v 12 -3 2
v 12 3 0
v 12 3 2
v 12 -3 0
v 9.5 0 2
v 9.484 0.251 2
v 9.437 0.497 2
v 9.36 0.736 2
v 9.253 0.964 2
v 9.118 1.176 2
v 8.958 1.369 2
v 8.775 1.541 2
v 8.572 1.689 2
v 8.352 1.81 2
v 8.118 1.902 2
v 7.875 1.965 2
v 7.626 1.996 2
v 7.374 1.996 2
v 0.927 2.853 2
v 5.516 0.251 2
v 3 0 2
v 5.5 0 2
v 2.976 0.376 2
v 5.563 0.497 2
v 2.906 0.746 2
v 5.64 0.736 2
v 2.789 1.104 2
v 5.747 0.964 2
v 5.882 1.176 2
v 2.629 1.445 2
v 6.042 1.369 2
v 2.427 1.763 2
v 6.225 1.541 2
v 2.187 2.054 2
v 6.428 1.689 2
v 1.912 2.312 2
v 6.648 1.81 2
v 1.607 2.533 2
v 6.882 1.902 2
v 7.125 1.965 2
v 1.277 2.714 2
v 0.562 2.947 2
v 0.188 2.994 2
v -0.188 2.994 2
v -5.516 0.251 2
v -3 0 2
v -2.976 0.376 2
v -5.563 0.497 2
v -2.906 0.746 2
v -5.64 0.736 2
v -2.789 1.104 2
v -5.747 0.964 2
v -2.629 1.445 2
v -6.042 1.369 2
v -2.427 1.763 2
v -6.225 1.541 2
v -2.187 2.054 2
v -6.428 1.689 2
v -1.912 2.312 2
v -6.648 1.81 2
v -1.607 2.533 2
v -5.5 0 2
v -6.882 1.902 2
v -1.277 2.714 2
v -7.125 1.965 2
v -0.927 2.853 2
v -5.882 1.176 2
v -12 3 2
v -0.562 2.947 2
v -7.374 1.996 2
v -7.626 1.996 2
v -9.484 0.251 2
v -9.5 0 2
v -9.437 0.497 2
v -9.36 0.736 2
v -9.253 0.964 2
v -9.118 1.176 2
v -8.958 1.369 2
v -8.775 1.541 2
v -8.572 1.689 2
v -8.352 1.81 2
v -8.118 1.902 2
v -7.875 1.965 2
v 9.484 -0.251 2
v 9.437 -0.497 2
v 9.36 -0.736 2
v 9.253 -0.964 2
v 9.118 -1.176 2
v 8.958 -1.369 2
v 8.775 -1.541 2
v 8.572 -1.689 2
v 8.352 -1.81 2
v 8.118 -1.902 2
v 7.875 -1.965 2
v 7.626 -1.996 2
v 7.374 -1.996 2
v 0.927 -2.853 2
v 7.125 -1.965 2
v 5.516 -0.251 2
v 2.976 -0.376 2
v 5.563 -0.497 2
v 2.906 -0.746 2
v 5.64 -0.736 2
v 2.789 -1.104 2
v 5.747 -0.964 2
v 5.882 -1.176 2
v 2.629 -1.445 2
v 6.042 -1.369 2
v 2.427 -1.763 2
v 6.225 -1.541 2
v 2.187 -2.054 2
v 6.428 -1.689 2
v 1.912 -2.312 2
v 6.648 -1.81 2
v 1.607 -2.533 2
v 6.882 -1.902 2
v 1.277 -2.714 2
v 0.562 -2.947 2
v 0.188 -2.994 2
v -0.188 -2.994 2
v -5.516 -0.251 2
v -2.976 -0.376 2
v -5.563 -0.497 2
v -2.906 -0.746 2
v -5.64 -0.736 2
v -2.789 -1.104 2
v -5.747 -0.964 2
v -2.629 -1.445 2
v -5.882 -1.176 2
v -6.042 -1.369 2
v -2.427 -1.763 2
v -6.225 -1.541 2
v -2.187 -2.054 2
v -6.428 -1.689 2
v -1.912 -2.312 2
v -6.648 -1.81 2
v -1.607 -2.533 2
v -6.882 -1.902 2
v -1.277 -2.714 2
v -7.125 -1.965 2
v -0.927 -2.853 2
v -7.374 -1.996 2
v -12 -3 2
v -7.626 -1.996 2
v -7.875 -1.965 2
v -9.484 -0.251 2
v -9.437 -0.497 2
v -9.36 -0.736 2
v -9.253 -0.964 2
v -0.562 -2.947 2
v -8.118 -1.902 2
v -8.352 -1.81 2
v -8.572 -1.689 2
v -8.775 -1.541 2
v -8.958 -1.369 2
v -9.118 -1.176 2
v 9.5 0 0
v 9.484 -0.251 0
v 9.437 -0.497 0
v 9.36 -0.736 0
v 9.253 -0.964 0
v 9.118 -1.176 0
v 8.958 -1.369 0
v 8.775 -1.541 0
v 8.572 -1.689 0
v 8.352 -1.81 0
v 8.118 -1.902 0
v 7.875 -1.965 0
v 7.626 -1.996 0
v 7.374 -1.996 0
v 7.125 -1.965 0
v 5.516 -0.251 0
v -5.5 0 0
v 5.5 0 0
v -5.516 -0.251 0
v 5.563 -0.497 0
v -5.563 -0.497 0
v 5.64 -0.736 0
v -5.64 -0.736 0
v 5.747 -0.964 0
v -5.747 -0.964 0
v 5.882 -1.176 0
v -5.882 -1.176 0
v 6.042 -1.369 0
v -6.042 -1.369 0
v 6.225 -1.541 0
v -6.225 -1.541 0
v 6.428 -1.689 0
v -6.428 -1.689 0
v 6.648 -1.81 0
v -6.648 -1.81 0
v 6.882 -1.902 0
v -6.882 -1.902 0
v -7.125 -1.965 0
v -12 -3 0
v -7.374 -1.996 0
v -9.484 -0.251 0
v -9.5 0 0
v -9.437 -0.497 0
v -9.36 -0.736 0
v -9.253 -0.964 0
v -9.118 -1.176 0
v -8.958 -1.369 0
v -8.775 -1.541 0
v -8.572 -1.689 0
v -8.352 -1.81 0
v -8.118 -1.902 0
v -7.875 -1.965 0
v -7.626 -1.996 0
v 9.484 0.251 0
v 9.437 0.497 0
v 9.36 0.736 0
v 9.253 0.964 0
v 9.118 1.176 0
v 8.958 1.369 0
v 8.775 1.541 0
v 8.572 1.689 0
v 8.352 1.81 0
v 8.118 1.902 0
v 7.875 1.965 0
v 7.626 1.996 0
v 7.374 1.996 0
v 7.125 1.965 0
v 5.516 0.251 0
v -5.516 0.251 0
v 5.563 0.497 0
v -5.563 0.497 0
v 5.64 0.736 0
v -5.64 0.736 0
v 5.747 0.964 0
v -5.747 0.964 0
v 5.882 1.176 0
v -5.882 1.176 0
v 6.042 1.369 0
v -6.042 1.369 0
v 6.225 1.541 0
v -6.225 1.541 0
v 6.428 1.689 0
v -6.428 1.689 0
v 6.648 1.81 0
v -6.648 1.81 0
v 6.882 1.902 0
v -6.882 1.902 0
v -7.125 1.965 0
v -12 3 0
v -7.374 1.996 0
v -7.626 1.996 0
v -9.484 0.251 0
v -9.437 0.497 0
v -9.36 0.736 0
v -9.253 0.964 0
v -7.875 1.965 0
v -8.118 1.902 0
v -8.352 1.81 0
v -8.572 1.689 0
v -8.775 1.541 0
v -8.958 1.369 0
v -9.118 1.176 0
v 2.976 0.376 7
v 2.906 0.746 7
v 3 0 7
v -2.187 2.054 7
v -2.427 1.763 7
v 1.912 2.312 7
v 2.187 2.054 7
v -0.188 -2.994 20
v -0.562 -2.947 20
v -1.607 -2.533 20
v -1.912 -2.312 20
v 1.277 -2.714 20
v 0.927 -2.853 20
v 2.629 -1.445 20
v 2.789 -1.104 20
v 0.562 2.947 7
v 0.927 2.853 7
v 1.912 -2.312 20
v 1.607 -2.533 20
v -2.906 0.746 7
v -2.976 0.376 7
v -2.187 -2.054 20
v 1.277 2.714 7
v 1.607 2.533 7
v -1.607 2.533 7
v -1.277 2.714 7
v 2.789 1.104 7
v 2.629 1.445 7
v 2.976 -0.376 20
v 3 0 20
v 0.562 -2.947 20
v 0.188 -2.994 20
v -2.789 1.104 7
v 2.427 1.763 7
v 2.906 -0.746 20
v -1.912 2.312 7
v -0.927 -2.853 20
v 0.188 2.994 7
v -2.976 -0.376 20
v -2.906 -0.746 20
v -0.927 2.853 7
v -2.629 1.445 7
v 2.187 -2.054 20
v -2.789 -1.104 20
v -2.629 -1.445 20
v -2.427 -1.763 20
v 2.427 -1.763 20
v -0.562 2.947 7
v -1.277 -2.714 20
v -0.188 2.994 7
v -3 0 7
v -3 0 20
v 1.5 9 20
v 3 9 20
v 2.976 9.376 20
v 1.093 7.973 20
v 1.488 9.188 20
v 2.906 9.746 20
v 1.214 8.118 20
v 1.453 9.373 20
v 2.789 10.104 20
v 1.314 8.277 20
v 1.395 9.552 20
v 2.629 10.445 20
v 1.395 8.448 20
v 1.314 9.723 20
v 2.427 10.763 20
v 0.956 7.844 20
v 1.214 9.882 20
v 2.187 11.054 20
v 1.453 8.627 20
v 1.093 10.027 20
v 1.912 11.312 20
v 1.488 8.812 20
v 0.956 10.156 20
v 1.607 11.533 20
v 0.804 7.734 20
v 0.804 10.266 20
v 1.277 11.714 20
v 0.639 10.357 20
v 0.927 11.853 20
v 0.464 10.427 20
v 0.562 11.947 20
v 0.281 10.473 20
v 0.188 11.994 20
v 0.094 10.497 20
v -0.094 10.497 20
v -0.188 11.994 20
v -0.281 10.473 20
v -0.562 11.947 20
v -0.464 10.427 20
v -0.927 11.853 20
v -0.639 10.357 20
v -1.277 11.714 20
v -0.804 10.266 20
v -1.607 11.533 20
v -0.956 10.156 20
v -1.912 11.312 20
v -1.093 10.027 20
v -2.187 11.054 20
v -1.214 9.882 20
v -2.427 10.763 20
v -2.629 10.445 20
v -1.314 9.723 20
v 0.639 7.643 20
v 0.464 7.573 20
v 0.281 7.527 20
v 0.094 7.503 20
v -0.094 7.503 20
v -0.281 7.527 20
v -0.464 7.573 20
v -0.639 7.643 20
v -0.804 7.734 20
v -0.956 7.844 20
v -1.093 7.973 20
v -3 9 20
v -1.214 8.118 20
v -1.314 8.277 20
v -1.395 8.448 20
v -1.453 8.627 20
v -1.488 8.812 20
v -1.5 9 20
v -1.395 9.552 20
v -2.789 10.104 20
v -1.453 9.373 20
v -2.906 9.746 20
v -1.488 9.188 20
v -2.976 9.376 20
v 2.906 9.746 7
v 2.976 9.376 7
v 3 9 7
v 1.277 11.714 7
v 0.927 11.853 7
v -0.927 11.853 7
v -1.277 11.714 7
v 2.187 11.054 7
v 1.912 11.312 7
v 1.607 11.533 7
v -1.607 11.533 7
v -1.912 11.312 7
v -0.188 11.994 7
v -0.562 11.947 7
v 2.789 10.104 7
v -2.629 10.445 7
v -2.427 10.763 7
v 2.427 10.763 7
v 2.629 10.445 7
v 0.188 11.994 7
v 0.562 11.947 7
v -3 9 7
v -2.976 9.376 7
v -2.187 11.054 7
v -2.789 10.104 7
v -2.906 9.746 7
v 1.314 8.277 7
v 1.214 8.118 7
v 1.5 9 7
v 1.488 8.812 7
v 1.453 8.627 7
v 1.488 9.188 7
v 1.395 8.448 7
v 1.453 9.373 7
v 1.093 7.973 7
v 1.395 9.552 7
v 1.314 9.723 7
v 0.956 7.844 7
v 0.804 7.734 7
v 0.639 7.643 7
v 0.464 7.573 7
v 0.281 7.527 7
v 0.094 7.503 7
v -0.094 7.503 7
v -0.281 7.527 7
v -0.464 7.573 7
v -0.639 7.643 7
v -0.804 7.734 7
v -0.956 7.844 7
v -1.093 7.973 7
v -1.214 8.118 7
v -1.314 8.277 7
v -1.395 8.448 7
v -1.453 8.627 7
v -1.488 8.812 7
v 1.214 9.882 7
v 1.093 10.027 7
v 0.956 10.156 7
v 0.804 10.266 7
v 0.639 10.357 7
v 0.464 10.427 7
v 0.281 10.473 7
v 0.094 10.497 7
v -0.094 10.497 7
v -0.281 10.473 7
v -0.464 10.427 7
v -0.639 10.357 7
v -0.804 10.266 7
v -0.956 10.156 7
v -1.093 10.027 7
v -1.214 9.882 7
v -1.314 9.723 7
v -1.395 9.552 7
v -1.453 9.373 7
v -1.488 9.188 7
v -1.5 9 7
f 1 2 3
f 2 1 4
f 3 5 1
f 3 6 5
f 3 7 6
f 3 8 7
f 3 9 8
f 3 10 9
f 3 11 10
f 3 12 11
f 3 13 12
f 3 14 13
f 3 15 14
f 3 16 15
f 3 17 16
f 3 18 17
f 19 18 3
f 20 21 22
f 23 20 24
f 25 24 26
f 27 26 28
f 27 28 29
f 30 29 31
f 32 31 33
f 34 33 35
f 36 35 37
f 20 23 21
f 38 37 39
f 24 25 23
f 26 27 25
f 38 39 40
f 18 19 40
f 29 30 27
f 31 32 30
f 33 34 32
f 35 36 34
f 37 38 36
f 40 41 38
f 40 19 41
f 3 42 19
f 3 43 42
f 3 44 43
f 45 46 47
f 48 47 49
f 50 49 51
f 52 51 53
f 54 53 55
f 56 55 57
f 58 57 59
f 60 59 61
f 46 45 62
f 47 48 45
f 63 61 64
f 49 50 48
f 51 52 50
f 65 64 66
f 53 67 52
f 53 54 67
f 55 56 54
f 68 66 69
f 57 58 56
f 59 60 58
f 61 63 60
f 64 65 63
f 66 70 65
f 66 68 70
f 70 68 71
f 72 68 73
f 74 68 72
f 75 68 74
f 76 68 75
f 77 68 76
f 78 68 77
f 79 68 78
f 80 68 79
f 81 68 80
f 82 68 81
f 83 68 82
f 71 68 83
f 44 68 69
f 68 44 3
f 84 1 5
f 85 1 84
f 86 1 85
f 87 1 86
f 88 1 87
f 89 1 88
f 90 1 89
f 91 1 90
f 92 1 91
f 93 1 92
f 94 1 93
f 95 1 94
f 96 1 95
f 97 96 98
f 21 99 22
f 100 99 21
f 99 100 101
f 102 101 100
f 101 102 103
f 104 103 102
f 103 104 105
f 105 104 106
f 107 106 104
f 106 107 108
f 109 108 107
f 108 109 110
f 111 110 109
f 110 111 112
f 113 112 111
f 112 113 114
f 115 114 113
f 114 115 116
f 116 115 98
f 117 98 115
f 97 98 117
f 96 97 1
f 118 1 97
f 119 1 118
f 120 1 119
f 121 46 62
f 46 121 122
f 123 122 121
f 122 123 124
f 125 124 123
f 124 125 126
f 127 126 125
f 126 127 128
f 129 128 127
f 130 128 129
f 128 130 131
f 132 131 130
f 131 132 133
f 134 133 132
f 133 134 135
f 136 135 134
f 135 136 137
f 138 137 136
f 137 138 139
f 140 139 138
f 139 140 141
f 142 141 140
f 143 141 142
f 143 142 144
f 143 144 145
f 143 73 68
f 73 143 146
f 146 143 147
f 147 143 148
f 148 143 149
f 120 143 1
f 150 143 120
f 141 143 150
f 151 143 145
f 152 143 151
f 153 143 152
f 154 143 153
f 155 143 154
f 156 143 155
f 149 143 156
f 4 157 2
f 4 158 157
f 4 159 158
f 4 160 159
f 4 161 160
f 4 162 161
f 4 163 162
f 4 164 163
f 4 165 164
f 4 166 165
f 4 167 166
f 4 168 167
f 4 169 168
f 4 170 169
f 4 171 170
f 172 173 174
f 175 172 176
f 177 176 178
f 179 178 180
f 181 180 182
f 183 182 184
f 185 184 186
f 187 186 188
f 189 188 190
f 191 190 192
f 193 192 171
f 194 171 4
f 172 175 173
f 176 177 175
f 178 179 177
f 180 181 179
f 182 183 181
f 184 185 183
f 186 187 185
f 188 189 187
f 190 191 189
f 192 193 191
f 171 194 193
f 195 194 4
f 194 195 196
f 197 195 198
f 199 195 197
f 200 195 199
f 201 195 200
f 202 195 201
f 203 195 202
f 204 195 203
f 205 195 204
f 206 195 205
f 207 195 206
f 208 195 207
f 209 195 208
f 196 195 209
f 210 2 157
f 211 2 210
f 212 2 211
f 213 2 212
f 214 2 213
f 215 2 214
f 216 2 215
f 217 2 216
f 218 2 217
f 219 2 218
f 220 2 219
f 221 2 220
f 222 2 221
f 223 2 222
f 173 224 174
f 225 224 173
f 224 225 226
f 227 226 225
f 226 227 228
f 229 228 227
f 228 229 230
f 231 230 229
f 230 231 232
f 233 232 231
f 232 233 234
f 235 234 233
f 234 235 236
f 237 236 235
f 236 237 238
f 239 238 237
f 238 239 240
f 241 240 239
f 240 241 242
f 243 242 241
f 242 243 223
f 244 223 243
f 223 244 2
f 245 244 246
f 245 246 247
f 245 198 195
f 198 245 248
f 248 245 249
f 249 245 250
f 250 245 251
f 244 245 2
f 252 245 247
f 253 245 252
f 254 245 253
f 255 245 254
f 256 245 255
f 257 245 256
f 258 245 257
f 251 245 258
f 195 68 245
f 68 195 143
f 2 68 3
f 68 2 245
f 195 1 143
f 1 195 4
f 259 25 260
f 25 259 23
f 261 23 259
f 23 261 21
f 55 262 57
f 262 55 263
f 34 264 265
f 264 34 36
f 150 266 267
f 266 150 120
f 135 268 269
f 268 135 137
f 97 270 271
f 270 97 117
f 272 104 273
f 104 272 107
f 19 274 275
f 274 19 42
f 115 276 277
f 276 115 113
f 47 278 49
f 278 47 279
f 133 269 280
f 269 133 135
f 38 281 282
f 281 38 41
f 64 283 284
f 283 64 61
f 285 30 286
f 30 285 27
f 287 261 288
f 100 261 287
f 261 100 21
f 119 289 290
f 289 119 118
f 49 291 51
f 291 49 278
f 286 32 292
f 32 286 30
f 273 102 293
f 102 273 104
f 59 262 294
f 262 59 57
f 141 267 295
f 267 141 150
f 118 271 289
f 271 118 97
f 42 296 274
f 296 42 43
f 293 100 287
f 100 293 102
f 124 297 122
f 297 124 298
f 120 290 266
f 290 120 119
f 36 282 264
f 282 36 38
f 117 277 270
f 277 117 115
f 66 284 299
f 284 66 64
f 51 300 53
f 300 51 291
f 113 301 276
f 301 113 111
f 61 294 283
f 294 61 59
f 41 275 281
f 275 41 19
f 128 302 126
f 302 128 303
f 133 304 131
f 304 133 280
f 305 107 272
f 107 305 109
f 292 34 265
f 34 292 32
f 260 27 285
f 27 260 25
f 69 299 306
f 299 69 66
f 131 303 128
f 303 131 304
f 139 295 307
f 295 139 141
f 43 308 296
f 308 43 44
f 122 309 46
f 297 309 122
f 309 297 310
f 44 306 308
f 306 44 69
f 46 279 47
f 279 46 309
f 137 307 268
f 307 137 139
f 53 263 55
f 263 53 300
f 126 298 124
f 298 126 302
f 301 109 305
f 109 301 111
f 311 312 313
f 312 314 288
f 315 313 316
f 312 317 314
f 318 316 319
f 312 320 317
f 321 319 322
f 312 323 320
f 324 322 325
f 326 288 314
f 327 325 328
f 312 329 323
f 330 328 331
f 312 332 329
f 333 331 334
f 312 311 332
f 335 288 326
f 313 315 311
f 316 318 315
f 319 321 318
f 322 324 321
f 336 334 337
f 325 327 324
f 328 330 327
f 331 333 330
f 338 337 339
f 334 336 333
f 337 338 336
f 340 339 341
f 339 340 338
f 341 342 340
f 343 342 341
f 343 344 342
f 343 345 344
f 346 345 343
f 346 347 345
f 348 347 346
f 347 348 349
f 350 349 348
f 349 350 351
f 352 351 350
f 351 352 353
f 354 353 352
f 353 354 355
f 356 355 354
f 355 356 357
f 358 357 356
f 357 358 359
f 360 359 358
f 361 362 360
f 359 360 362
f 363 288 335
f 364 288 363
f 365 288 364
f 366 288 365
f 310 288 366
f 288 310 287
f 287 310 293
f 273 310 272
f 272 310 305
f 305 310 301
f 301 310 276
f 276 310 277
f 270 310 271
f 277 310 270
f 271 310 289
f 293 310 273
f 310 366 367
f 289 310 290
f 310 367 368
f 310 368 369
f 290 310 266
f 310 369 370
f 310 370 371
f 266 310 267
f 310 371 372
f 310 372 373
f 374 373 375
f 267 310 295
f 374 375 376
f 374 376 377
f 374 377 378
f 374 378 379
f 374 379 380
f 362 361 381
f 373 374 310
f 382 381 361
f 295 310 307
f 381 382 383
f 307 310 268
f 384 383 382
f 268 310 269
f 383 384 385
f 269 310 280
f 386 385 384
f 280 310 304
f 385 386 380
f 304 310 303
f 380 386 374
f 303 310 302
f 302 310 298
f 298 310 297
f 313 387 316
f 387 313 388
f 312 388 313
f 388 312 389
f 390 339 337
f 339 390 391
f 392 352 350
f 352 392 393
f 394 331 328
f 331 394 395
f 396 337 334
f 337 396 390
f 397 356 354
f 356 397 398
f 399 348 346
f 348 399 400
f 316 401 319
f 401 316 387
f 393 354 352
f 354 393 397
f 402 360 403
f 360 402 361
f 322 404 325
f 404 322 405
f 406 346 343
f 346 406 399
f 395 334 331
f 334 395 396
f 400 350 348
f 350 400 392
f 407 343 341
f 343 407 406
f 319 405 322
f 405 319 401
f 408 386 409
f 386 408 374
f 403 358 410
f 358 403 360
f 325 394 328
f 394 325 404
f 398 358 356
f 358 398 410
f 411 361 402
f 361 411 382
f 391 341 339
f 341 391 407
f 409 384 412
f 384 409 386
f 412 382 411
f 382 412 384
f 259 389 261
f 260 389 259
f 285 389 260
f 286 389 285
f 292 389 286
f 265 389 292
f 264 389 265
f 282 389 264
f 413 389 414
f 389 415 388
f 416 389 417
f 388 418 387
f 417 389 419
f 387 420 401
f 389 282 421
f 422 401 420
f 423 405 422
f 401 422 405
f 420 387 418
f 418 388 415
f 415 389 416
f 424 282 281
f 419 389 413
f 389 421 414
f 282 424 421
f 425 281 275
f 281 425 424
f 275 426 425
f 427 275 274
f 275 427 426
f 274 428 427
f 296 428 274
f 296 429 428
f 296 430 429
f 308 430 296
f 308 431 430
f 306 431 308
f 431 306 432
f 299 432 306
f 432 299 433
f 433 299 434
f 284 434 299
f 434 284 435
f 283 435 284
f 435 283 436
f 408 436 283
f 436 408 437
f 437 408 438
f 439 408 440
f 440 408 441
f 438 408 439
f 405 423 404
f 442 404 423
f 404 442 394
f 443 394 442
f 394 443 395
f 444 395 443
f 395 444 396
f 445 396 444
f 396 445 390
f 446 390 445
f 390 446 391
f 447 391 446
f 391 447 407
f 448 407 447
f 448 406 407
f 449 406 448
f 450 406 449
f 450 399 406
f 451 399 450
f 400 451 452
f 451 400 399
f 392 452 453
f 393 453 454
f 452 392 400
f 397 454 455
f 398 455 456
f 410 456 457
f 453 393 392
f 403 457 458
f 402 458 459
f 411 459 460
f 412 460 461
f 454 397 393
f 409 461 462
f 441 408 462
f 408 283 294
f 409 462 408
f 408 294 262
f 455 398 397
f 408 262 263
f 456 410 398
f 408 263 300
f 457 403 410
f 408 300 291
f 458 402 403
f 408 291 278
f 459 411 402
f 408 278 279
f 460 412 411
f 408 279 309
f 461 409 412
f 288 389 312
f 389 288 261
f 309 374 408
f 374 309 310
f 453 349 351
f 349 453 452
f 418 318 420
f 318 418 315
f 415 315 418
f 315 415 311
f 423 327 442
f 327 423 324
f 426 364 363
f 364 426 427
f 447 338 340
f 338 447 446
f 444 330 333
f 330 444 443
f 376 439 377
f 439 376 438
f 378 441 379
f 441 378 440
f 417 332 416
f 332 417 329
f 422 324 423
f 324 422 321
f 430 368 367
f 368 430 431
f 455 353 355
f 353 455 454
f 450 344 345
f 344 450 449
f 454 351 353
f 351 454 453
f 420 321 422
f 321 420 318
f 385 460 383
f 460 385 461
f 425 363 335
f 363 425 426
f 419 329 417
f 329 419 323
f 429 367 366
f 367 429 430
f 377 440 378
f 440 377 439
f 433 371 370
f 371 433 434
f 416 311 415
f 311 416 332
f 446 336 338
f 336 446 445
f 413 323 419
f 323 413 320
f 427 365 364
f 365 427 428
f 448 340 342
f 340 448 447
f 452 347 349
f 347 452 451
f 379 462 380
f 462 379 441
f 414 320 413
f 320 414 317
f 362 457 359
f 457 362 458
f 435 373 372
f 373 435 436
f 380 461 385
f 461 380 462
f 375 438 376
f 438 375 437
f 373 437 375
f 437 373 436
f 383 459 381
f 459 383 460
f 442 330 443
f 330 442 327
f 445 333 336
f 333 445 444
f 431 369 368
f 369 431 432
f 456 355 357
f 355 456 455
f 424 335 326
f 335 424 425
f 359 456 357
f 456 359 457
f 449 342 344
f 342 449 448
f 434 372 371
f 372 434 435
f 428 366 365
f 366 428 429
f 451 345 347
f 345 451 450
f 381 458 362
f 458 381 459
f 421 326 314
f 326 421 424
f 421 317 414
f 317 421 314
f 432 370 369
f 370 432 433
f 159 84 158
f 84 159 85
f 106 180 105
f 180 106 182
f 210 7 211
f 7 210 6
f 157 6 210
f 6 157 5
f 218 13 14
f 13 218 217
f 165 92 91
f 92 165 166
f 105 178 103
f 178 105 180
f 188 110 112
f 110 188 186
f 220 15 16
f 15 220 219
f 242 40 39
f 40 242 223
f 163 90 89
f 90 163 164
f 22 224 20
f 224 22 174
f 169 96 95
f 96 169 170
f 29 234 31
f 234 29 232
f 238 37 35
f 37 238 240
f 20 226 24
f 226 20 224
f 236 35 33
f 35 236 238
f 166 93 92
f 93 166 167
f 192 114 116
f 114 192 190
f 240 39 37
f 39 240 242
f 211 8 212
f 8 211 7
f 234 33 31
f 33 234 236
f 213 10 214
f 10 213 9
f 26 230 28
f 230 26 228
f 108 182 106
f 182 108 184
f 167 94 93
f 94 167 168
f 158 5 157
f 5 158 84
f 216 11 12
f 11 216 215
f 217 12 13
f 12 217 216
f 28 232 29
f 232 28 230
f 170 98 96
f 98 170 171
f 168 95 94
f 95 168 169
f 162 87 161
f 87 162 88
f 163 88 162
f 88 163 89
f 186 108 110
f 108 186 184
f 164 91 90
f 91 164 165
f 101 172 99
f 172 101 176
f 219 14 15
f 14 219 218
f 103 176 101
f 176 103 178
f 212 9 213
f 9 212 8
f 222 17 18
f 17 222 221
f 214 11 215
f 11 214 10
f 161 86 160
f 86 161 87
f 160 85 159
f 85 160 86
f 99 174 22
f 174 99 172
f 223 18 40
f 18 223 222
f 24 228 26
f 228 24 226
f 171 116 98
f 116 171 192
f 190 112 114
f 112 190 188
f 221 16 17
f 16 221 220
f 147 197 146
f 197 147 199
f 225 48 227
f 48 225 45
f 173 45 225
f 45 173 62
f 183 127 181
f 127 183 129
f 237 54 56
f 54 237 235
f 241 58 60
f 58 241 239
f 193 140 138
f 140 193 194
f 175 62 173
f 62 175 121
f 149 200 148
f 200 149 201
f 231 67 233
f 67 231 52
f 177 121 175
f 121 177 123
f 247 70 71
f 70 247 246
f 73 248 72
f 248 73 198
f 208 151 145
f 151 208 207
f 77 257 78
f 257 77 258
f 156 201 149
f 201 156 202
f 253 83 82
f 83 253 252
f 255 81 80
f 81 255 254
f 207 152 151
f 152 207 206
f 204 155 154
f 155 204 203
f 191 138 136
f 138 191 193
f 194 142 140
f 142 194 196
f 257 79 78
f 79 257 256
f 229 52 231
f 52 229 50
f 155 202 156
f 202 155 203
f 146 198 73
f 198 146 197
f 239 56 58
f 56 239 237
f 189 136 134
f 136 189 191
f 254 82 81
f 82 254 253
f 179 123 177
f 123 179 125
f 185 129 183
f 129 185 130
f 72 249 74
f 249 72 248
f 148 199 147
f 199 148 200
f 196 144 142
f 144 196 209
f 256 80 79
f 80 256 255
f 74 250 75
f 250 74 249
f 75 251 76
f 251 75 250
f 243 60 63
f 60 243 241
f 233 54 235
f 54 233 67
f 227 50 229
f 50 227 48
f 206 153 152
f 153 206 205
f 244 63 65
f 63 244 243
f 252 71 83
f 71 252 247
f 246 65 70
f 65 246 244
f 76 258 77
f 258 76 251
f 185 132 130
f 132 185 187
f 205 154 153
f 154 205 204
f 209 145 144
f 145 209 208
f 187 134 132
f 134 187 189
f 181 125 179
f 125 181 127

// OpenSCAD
//prefixes:
//d_ distance
//r_ radius
//h_ height
//w_ width
//l_ length
//m_ margin
//o_ offset

$fn=50;

r_outer=3;
r_inner=1.5;
r_screwhole=2;
h_upper=13;
h_total=20;

d_upper = 3 + (r_outer*2);
o_cube = h_total-h_upper;
l_cube = d_upper;

l_baseplate=24;
w_baseplate=r_outer*2;
h_baseplate=2;
o_screwhole_baseplate=7.5;

difference(){

union(){
    
       translate([-l_baseplate/2,-w_baseplate/2,0])
        cube([l_baseplate,w_baseplate,h_baseplate]);
    
    
    cylinder(r=r_outer,h=h_total);

    translate([0,d_upper,h_total-h_upper])
        cylinder(r=r_outer,h=h_upper);
 
    translate([-r_outer,0,o_cube])
        cube([r_outer*2,l_cube,h_upper]);
        }
  translate([0,d_upper,h_total-h_upper])
cylinder(r=r_inner,h=h_upper*2);
        
        
translate([o_screwhole_baseplate,0,0])
    cylinder(r=r_screwhole,h=h_baseplate);     

translate([-o_screwhole_baseplate,0,0])
    cylinder(r=r_screwhole,h=h_baseplate);     
    
        
}
